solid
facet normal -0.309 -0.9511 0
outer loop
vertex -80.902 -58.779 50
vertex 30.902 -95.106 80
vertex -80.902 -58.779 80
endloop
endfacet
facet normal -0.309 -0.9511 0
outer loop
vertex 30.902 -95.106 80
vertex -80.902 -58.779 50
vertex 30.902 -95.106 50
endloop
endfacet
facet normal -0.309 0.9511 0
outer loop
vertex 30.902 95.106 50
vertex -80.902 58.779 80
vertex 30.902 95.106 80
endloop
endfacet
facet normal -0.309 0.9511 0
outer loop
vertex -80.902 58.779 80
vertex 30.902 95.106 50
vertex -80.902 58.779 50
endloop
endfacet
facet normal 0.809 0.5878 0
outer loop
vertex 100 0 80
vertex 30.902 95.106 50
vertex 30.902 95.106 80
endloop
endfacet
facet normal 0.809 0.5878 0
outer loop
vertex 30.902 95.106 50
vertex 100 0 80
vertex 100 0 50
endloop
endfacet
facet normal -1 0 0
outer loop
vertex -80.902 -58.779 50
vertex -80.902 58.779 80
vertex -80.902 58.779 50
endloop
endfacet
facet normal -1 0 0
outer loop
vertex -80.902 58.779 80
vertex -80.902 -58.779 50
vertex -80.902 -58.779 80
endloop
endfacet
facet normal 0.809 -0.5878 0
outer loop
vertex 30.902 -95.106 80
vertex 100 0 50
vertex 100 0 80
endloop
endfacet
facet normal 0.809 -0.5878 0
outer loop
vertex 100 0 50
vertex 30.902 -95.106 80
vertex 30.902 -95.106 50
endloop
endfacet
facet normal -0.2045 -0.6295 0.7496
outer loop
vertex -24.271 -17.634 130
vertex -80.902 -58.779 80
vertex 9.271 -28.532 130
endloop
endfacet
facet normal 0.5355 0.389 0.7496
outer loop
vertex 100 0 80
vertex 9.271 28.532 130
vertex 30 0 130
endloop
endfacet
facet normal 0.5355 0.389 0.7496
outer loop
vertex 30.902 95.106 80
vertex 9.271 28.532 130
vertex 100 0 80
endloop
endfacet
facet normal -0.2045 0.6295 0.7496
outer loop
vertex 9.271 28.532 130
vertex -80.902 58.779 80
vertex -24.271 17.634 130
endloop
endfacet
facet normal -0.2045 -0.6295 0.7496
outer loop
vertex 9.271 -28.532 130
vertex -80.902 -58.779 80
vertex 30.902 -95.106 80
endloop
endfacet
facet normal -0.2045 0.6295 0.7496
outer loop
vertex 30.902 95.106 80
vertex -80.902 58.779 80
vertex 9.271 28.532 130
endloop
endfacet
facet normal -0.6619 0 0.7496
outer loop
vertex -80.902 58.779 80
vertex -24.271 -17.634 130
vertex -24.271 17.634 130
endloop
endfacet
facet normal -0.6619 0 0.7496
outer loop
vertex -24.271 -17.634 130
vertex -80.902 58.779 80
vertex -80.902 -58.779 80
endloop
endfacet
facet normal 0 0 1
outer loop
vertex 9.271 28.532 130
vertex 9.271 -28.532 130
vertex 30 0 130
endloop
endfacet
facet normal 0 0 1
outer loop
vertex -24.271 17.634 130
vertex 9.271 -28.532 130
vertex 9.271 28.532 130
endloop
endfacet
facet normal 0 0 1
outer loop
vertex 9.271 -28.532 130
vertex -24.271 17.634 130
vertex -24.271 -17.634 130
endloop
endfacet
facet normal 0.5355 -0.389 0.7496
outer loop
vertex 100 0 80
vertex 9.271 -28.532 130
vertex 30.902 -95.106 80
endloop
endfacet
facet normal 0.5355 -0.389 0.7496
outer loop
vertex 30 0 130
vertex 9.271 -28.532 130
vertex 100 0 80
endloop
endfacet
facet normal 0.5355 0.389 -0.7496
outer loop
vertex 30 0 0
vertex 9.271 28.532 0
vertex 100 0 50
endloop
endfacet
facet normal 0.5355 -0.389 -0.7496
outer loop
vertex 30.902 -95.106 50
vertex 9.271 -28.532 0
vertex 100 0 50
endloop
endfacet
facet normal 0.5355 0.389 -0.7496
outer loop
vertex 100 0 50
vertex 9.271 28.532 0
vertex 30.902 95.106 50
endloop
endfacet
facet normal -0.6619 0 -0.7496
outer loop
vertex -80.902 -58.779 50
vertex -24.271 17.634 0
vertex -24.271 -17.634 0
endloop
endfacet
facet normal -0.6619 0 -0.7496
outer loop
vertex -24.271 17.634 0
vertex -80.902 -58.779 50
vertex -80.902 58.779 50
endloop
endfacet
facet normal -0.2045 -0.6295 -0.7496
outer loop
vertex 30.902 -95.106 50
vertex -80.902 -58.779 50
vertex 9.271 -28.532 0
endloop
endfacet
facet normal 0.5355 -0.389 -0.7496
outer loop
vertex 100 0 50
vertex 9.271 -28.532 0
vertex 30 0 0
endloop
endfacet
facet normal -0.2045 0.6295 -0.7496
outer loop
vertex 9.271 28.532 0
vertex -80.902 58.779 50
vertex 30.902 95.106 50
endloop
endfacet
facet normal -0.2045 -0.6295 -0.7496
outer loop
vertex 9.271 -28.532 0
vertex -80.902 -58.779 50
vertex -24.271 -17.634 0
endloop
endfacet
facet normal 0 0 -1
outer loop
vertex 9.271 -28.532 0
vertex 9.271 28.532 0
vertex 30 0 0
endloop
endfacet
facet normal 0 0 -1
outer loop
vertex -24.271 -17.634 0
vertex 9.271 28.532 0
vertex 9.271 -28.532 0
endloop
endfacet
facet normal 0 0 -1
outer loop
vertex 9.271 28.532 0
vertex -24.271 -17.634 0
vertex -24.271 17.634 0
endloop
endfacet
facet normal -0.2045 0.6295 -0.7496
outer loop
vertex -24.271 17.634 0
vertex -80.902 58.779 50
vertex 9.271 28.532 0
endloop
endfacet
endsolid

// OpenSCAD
// trackable shape
module sensMace (width=100, midHeight=30, outerHeight=50, plateau=30, facets=5)
{
	//positive space
	translate([0,0,outerHeight])
		cylinder(r1=width, r2=width, h=midHeight,center=false, $fn=facets);
	translate ([0,0,midHeight+outerHeight])
		cylinder(r1=width, r2=plateau, h=outerHeight, center=false, $fn=facets);
	cylinder(r1=plateau, r2=width, h=outerHeight, center=false, $fn=facets);
	
	//negative space
	
	//subtract
}

module obsHandle(width=30, length=100, facets=5)
{
	translate([0,0,-length])
		cylinder(r1=width, r2=width, h=length, $fn=facets);
}

handleLength=200;
handleWidth=30;
sensMace(plateau=handleWidth);
